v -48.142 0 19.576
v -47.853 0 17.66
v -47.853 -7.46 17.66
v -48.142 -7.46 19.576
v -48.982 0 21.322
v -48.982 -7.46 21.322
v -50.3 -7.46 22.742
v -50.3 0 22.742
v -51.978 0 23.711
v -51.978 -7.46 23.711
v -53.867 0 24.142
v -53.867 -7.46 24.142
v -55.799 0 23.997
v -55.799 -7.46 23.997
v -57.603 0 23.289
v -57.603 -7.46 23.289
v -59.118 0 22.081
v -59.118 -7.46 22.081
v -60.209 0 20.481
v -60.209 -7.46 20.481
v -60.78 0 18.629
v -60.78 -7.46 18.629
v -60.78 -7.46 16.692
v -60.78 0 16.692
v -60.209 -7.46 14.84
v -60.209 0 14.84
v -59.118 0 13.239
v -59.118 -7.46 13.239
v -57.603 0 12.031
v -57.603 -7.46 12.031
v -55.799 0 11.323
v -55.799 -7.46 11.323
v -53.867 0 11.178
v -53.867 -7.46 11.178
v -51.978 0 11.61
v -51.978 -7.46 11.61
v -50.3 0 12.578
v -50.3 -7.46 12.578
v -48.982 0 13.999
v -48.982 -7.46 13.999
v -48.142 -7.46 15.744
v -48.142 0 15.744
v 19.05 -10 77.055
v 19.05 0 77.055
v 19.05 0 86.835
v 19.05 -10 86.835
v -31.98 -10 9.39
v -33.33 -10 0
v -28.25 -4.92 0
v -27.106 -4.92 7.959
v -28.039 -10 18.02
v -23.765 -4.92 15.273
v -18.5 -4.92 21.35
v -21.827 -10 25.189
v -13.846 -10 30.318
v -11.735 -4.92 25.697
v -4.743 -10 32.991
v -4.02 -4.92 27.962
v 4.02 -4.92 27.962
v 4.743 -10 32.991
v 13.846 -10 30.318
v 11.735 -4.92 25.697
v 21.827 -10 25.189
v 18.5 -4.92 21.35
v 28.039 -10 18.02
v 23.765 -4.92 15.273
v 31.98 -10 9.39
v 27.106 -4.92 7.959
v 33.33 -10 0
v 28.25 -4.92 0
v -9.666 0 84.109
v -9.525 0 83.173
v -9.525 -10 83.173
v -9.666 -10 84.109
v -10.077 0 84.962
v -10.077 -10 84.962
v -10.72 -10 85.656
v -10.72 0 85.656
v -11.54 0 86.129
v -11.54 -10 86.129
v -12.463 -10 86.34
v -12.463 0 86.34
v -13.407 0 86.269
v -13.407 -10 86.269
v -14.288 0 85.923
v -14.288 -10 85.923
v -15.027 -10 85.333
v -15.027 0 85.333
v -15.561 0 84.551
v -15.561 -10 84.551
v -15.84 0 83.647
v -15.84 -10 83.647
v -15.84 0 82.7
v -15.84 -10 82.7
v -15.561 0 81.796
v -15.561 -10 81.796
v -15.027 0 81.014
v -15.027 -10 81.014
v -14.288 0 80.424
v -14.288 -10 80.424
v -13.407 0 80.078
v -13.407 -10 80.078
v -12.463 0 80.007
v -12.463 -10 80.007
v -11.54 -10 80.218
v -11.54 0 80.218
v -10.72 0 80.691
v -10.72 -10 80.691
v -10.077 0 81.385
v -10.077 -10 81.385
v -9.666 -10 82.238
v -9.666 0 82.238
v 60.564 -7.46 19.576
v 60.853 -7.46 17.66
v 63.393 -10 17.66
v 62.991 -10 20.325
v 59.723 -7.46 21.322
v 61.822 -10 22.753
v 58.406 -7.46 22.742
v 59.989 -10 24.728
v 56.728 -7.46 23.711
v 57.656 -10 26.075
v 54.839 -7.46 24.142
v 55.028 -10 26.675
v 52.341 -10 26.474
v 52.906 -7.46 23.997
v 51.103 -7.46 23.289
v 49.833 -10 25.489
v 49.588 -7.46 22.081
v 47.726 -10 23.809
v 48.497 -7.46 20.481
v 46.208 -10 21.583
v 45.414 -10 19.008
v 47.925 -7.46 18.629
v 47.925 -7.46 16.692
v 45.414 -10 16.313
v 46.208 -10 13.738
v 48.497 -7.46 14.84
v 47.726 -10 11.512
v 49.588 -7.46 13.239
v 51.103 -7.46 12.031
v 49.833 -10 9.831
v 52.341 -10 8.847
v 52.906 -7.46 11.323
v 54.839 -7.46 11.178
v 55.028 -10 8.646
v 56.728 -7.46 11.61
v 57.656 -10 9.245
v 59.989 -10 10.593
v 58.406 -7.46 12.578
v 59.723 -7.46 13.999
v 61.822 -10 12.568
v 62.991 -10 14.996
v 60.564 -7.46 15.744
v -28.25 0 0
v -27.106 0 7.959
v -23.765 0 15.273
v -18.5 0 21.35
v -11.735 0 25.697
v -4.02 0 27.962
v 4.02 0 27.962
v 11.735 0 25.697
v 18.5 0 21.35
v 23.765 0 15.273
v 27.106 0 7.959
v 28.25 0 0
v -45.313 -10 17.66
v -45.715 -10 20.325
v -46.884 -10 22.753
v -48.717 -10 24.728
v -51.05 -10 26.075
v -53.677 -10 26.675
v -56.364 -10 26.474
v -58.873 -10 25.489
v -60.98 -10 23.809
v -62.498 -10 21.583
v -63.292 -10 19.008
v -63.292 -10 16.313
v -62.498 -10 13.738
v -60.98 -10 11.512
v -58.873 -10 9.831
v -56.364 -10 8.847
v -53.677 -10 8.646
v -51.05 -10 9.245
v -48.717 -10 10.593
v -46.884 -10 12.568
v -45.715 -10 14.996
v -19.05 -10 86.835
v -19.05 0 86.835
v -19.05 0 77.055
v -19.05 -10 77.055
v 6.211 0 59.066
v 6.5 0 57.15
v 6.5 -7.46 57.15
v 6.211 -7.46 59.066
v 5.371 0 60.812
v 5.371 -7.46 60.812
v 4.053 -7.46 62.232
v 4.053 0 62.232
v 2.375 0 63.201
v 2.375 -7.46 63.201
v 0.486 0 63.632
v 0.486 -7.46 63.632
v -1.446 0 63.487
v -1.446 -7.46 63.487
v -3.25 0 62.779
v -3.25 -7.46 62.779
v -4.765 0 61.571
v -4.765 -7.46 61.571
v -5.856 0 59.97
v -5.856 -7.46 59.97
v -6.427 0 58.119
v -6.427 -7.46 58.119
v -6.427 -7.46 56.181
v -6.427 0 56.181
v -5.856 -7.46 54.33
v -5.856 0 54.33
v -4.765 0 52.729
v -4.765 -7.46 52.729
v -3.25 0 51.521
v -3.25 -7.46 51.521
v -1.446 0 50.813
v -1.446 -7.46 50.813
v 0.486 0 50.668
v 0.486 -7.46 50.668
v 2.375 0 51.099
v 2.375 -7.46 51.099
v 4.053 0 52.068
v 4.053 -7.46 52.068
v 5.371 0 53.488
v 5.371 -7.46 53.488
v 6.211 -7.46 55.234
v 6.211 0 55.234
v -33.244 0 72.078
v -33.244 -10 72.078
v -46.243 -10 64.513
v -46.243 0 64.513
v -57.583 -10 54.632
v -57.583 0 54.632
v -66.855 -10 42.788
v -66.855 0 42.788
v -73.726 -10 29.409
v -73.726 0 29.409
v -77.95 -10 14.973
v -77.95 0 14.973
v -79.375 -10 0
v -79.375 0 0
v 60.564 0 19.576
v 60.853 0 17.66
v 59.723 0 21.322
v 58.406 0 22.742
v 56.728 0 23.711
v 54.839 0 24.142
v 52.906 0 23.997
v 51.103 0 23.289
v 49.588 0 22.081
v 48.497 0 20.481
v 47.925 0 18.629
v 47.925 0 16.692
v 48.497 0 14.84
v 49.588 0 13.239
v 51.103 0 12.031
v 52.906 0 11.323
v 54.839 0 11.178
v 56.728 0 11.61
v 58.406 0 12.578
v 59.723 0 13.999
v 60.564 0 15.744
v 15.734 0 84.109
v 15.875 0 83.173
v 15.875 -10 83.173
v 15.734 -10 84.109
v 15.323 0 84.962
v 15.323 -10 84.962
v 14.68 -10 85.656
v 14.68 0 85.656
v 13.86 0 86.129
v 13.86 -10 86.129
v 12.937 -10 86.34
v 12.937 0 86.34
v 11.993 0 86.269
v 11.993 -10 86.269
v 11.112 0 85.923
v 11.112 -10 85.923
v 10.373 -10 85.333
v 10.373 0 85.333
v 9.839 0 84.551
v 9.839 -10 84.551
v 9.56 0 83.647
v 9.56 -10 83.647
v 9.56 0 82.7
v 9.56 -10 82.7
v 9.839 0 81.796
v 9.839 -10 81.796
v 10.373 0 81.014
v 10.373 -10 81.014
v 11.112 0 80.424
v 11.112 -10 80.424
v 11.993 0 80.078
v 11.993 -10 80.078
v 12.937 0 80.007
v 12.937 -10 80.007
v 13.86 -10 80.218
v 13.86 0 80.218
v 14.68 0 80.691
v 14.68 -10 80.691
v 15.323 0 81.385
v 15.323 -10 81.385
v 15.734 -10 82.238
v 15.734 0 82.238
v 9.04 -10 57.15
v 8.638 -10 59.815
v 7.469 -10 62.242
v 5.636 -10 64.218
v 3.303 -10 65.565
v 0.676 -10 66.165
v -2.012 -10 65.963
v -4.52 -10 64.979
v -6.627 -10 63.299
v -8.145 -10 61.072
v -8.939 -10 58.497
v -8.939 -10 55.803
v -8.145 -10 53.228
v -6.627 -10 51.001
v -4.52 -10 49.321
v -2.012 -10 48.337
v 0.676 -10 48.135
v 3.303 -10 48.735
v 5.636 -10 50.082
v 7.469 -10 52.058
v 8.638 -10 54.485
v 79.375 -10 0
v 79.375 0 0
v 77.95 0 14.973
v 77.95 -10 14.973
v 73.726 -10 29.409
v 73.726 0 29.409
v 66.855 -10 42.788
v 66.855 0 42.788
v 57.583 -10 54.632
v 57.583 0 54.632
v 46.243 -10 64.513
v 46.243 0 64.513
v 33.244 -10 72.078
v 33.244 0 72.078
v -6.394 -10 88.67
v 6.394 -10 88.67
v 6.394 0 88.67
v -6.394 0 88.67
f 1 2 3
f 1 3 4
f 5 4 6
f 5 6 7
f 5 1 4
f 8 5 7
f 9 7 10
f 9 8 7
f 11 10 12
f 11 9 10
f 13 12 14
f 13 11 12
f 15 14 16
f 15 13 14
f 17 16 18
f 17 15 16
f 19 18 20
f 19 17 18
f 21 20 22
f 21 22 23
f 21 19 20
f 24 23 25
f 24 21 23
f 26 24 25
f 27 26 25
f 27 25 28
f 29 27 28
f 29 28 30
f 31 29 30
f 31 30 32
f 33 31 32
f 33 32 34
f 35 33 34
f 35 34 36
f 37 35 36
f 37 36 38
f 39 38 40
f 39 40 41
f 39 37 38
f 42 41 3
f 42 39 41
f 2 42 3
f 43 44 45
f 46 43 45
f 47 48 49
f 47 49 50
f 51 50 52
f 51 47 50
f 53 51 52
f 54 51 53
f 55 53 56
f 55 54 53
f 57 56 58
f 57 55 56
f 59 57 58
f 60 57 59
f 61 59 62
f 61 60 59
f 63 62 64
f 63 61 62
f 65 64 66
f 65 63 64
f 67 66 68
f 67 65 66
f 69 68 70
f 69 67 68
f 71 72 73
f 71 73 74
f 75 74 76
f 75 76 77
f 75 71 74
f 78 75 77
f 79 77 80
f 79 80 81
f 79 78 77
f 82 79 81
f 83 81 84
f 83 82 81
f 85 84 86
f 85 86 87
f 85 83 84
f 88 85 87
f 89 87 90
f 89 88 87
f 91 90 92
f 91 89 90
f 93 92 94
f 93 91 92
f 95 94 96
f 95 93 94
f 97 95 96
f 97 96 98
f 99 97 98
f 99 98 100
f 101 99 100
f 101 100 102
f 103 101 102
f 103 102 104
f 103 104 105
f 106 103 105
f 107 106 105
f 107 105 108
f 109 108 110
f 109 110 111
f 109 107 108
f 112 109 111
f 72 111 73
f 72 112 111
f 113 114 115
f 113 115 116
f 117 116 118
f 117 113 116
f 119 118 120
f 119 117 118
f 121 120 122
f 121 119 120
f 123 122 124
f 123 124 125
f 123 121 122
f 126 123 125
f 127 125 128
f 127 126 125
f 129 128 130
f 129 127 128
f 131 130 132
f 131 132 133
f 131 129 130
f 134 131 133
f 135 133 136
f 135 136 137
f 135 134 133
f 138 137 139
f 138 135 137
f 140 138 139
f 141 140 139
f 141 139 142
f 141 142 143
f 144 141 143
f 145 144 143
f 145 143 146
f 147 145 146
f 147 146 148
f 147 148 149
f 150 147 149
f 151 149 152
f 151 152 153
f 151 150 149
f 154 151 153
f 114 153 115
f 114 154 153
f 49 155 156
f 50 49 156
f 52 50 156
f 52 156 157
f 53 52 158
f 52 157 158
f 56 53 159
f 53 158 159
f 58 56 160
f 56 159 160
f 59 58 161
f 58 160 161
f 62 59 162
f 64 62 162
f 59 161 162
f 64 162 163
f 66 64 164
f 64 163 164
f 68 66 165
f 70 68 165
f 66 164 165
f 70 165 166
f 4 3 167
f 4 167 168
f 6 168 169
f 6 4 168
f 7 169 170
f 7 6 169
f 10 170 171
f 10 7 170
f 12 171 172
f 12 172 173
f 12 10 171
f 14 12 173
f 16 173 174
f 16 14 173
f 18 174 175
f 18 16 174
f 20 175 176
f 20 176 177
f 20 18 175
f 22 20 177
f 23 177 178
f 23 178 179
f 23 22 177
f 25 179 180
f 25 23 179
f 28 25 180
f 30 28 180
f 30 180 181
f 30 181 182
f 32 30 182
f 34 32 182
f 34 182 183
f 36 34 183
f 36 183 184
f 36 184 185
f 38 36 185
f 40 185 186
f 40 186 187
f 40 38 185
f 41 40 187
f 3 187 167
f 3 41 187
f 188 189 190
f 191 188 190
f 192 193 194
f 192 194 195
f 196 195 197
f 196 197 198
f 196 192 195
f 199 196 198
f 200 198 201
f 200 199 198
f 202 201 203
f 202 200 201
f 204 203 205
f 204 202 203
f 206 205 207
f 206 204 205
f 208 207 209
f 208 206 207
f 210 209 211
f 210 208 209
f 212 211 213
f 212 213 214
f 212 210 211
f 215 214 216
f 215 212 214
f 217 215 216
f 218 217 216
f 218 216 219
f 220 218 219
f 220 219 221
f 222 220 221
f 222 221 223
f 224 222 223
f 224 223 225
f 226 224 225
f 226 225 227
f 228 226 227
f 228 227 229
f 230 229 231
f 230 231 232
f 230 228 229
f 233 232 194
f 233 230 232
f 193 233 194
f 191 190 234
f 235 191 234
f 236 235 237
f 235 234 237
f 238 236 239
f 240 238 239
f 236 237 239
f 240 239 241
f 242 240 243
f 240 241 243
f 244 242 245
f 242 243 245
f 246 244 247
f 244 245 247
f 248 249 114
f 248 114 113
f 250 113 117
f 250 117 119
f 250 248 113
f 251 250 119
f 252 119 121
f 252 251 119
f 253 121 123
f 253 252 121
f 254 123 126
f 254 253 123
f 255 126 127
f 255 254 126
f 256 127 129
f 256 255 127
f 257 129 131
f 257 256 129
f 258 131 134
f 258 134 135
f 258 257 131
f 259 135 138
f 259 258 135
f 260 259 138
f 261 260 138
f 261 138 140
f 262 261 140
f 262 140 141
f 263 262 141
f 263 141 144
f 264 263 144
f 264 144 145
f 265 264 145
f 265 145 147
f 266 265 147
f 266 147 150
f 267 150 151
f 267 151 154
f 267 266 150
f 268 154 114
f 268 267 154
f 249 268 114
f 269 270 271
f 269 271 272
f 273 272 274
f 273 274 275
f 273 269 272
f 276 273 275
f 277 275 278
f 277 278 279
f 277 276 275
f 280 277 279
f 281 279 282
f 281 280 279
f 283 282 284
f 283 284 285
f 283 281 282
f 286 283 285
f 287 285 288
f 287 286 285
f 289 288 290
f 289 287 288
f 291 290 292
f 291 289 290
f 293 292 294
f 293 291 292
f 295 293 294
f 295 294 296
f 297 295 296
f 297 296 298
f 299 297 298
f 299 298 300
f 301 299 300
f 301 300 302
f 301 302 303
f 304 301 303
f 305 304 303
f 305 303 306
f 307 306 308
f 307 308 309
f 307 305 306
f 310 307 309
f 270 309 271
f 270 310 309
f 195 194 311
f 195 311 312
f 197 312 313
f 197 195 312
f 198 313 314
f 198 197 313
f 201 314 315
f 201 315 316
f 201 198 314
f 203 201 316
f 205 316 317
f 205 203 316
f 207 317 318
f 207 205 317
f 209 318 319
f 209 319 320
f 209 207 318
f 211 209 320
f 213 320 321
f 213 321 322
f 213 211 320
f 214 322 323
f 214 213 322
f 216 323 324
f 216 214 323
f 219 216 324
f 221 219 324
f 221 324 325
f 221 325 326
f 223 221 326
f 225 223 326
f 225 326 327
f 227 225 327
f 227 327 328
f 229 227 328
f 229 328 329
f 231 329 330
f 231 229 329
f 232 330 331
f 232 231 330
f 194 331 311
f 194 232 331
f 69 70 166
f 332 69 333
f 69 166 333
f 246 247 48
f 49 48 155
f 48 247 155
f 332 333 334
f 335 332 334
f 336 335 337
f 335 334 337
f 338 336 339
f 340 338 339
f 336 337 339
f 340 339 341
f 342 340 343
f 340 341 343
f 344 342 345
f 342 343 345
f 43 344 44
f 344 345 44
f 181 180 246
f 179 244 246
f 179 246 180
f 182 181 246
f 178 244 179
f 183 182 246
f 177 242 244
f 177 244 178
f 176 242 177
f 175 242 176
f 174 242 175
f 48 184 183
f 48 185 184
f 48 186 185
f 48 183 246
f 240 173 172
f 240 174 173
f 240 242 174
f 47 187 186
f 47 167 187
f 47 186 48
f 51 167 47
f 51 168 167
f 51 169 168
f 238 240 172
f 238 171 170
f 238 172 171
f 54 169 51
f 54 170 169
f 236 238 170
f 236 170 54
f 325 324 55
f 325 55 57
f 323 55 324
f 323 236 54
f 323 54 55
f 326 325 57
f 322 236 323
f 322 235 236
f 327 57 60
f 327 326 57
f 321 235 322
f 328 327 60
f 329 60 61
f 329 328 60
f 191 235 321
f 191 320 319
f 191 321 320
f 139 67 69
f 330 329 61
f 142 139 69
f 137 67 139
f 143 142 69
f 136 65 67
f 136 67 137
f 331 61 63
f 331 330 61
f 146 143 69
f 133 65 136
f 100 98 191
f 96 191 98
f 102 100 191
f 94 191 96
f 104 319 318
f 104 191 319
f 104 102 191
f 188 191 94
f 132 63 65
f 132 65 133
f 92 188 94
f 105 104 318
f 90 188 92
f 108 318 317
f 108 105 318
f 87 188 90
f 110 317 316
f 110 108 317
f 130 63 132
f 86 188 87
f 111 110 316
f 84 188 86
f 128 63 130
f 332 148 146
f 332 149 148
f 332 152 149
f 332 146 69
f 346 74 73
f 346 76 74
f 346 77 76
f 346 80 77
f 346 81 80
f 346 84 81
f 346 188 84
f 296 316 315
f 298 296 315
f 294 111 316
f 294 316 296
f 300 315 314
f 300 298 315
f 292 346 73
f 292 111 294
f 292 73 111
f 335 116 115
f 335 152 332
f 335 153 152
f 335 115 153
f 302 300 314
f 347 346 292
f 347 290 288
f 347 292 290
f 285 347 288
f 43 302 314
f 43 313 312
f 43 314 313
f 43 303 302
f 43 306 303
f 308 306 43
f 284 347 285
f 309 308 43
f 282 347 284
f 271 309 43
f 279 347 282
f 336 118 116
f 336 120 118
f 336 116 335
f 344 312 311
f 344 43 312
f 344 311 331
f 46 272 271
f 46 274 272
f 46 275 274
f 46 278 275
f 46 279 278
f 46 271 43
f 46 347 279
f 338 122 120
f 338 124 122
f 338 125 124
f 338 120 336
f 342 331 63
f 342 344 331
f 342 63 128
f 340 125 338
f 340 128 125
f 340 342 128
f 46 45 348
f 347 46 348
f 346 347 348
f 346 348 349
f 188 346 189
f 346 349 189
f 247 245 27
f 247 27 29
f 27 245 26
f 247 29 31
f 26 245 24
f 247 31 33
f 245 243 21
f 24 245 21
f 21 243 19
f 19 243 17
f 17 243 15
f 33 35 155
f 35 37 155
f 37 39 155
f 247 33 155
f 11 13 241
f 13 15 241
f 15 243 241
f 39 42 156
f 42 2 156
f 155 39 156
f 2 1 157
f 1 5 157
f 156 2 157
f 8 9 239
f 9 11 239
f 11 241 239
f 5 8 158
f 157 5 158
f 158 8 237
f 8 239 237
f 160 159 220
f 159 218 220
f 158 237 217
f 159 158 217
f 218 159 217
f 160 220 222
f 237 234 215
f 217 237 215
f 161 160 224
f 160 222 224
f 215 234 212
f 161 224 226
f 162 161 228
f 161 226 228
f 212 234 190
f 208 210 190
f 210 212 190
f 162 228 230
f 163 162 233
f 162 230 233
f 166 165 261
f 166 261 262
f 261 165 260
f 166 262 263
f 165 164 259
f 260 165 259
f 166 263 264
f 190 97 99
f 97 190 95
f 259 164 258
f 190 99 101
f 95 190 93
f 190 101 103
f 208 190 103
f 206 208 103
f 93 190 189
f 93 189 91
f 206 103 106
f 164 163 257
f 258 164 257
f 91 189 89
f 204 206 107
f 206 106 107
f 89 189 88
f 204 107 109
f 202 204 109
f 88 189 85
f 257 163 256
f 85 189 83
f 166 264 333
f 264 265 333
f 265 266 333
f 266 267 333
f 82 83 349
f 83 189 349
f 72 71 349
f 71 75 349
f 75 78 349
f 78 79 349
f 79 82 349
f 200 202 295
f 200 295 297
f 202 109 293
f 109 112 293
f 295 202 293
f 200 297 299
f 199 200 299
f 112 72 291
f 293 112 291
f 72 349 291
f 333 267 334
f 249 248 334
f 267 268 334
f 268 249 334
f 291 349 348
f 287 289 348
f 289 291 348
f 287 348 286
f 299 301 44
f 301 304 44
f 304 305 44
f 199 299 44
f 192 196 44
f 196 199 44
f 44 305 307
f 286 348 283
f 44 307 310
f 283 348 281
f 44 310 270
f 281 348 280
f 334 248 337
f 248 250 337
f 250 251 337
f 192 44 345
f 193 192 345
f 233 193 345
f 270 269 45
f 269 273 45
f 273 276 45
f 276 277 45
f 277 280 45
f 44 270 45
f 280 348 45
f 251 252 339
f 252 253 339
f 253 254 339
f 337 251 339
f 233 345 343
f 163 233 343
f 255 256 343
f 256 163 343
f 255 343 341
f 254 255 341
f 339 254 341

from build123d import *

# Parameters (mm, degrees)
F2_R     = 6.5
F2_R_2   = 3.175
F3_DEPTH = 10
F0_SIZE  = 5.08
F1_SIZE  = 2.54


# Not quite as in the source:
# - a feature names something its author has since deleted; it is built from what else it names


with BuildPart() as f3:
    # F2 (on Front) → F3 (new body)
    with BuildSketch(Plane.XZ):
        with BuildLine():
            Line((-19.05, 86.834944003), (-19.05, 77.0550979819))
            ThreePointArc((-19.05, 77.0550979819), (-62.4999375, 48.9300361486), (-79.375, 0))
            Line((-79.375, 0), (-28.25, 0))
            ThreePointArc((-28.25, 0), (0, 28.25), (28.25, 0))
            Line((28.25, 0), (79.375, 0))
            ThreePointArc((79.375, 0), (62.4999375, 48.9300361486), (19.05, 77.0550979819))
            Line((19.05, 77.0550979819), (19.05, 86.834944003))
            ThreePointArc((19.05, 86.834944003), (0, 88.9), (-19.05, 86.834944003))
        make_face()
        with Locations((-54.3528799063, 17.6603212285)):
            Circle(F2_R, mode=Mode.SUBTRACT)
        with Locations((54.3528799063, 17.6603212285)):
            Circle(F2_R, mode=Mode.SUBTRACT)
        with Locations((-12.7, 83.1734867987)):
            Circle(F2_R_2, mode=Mode.SUBTRACT)
        with Locations((0, 57.15)):
            Circle(F2_R, mode=Mode.SUBTRACT)
        with Locations((12.7, 83.1734867987)):
            Circle(F2_R_2, mode=Mode.SUBTRACT)
    extrude(amount=F3_DEPTH)

    # F0
    f0_edges = [f3.edges().sort_by_distance(p)[0] for p in [
        (0, -10, 28.25),
    ]]
    chamfer(f0_edges, length=F0_SIZE)

    # F1
    f1_edges = [f3.edges().sort_by_distance(p)[0] for p in [
        (-6.5, -10, 57.15),
        (-60.85288, -10, 17.660321),
        (47.85288, -10, 17.660321),
    ]]
    chamfer(f1_edges, length=F1_SIZE)


solid = f3.part
